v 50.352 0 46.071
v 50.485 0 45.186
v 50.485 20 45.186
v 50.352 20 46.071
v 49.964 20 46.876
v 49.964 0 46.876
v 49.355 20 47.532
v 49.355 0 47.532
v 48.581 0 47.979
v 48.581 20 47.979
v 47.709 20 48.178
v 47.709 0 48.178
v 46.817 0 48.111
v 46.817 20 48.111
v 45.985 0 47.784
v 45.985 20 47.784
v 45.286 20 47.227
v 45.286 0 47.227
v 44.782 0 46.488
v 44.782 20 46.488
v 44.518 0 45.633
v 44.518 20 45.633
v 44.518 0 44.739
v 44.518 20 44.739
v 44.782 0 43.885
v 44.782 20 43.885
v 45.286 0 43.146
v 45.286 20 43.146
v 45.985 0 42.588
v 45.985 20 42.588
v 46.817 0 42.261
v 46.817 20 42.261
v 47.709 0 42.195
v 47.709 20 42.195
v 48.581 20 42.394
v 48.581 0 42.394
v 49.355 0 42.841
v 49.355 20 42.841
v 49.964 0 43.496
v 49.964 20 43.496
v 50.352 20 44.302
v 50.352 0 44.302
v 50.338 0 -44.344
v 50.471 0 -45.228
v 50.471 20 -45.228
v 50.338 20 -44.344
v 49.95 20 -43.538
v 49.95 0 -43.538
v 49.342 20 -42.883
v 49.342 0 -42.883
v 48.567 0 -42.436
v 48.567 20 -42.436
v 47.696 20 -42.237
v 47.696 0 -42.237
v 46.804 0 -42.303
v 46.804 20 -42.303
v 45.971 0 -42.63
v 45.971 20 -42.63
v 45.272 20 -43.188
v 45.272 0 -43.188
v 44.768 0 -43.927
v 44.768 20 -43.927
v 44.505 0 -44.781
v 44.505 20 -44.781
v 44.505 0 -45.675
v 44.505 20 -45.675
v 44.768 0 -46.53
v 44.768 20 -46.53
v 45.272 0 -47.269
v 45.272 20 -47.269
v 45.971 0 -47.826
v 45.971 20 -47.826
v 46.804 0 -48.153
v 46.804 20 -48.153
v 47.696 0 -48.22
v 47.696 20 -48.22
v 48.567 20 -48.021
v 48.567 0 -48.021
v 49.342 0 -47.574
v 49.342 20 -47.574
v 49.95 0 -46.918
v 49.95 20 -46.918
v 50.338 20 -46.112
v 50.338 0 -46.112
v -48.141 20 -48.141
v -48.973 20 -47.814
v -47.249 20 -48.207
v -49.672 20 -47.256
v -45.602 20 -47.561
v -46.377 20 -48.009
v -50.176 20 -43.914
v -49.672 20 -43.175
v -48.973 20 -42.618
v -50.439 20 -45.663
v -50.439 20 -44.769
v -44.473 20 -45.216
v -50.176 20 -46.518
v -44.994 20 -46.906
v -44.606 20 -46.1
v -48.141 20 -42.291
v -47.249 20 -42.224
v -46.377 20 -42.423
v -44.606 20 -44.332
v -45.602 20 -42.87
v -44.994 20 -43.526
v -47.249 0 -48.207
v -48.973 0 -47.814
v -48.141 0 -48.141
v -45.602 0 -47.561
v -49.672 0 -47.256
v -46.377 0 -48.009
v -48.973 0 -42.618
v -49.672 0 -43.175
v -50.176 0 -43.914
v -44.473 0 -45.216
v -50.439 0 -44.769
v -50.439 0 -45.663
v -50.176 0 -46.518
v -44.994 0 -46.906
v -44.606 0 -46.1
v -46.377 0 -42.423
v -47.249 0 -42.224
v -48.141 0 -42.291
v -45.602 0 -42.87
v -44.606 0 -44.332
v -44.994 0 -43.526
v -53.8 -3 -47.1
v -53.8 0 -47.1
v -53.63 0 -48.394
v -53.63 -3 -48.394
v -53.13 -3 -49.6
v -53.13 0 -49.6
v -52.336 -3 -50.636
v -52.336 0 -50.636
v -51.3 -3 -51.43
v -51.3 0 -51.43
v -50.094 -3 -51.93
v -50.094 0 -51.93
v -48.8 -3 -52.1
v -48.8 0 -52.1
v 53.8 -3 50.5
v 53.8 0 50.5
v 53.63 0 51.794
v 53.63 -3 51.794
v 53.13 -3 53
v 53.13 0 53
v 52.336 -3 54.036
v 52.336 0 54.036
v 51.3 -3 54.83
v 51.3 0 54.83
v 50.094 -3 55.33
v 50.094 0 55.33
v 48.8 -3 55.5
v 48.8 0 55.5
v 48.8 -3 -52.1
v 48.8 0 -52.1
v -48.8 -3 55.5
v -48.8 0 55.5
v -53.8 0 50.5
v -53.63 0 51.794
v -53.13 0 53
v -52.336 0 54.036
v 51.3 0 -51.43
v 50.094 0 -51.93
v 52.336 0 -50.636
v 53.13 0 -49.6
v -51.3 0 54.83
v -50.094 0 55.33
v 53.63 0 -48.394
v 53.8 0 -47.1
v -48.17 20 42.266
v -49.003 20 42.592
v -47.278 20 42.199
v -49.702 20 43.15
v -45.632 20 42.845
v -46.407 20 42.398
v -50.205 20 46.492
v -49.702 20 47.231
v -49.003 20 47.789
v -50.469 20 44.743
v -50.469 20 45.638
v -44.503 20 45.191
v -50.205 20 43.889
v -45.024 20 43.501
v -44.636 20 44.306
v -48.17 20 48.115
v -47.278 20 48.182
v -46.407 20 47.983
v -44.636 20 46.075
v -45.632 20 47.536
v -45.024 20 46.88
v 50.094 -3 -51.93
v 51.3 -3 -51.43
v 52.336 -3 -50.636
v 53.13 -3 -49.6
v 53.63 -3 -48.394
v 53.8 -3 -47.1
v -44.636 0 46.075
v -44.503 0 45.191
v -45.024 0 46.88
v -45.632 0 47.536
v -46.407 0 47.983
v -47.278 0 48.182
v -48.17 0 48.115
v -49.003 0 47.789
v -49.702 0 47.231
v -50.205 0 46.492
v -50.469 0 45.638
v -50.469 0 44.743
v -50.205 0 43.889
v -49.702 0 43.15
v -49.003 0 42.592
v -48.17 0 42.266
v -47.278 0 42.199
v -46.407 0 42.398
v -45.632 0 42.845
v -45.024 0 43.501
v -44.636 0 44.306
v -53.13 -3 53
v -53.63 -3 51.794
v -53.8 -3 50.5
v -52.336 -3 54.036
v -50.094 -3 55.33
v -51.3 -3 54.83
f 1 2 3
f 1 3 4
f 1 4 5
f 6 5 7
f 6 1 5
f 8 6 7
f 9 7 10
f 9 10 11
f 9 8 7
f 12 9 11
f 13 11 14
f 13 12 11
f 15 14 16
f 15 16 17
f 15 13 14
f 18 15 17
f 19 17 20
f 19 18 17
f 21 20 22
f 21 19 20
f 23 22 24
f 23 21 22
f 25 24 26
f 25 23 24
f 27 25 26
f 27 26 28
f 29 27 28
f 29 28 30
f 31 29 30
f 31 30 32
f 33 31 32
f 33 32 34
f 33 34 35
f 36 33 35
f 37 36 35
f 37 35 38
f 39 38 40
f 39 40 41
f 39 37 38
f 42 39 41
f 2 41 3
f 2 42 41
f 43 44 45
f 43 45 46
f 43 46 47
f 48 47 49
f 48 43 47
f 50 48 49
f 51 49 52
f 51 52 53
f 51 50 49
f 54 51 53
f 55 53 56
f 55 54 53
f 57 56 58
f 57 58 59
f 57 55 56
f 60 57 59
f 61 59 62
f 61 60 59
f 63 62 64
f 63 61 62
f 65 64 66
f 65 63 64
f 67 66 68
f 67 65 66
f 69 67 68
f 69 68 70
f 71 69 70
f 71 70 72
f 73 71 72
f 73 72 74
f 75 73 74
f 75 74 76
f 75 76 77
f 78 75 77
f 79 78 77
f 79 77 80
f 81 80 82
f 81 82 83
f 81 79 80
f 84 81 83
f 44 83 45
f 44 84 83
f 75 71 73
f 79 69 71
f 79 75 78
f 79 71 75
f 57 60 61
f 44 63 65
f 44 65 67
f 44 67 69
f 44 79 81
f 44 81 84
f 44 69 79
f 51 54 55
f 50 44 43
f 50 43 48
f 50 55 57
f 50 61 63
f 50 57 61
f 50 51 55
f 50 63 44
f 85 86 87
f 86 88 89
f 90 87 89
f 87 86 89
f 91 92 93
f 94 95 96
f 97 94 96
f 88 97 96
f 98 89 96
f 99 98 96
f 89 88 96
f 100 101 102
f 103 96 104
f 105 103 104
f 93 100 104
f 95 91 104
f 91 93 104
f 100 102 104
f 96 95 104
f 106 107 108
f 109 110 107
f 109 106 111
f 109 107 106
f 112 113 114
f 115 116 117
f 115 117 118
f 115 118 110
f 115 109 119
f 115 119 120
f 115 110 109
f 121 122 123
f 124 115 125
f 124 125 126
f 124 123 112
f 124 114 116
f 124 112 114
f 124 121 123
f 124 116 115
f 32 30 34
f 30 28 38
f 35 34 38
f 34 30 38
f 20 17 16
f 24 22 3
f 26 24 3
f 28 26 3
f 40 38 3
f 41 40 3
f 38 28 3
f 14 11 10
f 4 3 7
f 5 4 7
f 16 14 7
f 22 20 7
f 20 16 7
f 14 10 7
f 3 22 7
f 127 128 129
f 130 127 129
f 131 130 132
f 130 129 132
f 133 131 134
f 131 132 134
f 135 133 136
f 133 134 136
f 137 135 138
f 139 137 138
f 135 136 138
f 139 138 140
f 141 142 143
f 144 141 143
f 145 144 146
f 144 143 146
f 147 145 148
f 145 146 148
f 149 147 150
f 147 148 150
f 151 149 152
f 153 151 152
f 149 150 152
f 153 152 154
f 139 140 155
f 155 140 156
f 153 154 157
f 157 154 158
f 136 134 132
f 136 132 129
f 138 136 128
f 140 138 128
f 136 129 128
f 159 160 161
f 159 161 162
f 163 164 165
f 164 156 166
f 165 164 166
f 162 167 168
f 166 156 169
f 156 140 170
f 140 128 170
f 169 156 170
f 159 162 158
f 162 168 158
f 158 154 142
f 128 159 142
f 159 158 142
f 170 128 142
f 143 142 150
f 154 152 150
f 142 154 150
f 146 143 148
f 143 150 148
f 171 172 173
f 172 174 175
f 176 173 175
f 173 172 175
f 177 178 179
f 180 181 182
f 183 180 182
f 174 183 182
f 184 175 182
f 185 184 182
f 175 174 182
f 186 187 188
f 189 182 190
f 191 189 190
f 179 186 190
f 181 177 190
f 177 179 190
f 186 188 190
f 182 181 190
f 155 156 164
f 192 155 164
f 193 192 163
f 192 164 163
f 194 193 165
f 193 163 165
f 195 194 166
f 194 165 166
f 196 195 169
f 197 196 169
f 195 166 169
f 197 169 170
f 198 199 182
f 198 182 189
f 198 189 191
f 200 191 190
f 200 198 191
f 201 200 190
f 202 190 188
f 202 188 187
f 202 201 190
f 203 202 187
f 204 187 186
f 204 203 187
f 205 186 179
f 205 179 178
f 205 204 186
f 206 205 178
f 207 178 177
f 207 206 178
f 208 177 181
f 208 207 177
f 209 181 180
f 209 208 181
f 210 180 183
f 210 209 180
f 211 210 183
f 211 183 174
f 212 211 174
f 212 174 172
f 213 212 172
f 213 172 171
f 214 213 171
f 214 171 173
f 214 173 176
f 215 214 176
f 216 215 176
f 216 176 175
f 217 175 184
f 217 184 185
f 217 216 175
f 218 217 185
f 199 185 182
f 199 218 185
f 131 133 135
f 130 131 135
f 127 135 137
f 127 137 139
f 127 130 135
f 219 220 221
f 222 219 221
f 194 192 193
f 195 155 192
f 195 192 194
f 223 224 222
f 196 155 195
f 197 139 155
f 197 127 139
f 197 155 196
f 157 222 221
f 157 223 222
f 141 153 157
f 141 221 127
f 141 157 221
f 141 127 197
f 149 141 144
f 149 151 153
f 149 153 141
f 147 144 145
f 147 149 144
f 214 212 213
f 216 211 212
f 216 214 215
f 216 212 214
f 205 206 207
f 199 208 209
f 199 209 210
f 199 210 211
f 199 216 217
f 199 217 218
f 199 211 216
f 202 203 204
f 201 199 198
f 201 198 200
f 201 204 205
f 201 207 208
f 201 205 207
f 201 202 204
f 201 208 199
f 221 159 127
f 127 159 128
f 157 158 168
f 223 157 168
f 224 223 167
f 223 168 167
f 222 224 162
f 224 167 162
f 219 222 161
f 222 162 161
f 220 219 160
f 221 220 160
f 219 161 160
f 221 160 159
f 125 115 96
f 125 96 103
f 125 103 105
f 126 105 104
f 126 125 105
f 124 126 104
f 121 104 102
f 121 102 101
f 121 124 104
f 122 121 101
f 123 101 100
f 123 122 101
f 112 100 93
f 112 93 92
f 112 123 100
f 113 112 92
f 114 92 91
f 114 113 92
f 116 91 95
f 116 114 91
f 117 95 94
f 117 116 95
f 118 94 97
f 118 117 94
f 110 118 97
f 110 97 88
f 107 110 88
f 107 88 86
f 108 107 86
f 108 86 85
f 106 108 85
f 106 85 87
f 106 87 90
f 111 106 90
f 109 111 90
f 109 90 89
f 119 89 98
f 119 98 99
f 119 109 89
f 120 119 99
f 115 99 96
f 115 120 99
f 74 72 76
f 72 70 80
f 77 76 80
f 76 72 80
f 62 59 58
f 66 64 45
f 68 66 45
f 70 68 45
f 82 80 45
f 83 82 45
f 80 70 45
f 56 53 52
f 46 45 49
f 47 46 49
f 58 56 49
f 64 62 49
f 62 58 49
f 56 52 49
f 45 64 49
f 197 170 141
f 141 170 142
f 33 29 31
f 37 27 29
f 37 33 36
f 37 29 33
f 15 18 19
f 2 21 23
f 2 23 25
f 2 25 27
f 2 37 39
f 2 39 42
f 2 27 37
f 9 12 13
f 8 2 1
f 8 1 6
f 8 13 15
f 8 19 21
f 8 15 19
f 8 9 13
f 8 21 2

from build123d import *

# Parameters (mm, degrees)
F2_R     = 3
F3_DEPTH = 20
F4_DEPTH = 3


with BuildPart() as f3:
    # F2 (on Front) → F3 (new body)
    with BuildSketch(Plane.XZ):
        with Locations((-47.502529, 45.190532)):
            Circle(F2_R)
        with Locations((47.484789, 45.186255)):
            Circle(F2_R)
        with Locations((47.471374, -45.228213)):
            Circle(F2_R)
        with Locations((-47.472939, -45.215879)):
            Circle(F2_R)
    extrude(amount=-F3_DEPTH)


with BuildPart() as f4:
    # F1 (on Front) → F4 (new body)
    with BuildSketch(Plane.XZ):
        with BuildLine():
            Line((53.8, -47.1), (53.8, 50.5))
            ThreePointArc((53.8, 50.5), (52.335534, 54.035534), (48.8, 55.5))
            Line((48.8, 55.5), (-48.8, 55.5))
            ThreePointArc((-48.8, 55.5), (-52.335534, 54.035534), (-53.8, 50.5))
            Line((-53.8, 50.5), (-53.8, -47.1))
            ThreePointArc((-53.8, -47.1), (-52.335534, -50.635534), (-48.8, -52.1))
            Line((-48.8, -52.1), (48.8, -52.1))
            ThreePointArc((48.8, -52.1), (52.335534, -50.635534), (53.8, -47.1))
        make_face()
    extrude(amount=F4_DEPTH)


solid = Compound([f3.part, f4.part])
